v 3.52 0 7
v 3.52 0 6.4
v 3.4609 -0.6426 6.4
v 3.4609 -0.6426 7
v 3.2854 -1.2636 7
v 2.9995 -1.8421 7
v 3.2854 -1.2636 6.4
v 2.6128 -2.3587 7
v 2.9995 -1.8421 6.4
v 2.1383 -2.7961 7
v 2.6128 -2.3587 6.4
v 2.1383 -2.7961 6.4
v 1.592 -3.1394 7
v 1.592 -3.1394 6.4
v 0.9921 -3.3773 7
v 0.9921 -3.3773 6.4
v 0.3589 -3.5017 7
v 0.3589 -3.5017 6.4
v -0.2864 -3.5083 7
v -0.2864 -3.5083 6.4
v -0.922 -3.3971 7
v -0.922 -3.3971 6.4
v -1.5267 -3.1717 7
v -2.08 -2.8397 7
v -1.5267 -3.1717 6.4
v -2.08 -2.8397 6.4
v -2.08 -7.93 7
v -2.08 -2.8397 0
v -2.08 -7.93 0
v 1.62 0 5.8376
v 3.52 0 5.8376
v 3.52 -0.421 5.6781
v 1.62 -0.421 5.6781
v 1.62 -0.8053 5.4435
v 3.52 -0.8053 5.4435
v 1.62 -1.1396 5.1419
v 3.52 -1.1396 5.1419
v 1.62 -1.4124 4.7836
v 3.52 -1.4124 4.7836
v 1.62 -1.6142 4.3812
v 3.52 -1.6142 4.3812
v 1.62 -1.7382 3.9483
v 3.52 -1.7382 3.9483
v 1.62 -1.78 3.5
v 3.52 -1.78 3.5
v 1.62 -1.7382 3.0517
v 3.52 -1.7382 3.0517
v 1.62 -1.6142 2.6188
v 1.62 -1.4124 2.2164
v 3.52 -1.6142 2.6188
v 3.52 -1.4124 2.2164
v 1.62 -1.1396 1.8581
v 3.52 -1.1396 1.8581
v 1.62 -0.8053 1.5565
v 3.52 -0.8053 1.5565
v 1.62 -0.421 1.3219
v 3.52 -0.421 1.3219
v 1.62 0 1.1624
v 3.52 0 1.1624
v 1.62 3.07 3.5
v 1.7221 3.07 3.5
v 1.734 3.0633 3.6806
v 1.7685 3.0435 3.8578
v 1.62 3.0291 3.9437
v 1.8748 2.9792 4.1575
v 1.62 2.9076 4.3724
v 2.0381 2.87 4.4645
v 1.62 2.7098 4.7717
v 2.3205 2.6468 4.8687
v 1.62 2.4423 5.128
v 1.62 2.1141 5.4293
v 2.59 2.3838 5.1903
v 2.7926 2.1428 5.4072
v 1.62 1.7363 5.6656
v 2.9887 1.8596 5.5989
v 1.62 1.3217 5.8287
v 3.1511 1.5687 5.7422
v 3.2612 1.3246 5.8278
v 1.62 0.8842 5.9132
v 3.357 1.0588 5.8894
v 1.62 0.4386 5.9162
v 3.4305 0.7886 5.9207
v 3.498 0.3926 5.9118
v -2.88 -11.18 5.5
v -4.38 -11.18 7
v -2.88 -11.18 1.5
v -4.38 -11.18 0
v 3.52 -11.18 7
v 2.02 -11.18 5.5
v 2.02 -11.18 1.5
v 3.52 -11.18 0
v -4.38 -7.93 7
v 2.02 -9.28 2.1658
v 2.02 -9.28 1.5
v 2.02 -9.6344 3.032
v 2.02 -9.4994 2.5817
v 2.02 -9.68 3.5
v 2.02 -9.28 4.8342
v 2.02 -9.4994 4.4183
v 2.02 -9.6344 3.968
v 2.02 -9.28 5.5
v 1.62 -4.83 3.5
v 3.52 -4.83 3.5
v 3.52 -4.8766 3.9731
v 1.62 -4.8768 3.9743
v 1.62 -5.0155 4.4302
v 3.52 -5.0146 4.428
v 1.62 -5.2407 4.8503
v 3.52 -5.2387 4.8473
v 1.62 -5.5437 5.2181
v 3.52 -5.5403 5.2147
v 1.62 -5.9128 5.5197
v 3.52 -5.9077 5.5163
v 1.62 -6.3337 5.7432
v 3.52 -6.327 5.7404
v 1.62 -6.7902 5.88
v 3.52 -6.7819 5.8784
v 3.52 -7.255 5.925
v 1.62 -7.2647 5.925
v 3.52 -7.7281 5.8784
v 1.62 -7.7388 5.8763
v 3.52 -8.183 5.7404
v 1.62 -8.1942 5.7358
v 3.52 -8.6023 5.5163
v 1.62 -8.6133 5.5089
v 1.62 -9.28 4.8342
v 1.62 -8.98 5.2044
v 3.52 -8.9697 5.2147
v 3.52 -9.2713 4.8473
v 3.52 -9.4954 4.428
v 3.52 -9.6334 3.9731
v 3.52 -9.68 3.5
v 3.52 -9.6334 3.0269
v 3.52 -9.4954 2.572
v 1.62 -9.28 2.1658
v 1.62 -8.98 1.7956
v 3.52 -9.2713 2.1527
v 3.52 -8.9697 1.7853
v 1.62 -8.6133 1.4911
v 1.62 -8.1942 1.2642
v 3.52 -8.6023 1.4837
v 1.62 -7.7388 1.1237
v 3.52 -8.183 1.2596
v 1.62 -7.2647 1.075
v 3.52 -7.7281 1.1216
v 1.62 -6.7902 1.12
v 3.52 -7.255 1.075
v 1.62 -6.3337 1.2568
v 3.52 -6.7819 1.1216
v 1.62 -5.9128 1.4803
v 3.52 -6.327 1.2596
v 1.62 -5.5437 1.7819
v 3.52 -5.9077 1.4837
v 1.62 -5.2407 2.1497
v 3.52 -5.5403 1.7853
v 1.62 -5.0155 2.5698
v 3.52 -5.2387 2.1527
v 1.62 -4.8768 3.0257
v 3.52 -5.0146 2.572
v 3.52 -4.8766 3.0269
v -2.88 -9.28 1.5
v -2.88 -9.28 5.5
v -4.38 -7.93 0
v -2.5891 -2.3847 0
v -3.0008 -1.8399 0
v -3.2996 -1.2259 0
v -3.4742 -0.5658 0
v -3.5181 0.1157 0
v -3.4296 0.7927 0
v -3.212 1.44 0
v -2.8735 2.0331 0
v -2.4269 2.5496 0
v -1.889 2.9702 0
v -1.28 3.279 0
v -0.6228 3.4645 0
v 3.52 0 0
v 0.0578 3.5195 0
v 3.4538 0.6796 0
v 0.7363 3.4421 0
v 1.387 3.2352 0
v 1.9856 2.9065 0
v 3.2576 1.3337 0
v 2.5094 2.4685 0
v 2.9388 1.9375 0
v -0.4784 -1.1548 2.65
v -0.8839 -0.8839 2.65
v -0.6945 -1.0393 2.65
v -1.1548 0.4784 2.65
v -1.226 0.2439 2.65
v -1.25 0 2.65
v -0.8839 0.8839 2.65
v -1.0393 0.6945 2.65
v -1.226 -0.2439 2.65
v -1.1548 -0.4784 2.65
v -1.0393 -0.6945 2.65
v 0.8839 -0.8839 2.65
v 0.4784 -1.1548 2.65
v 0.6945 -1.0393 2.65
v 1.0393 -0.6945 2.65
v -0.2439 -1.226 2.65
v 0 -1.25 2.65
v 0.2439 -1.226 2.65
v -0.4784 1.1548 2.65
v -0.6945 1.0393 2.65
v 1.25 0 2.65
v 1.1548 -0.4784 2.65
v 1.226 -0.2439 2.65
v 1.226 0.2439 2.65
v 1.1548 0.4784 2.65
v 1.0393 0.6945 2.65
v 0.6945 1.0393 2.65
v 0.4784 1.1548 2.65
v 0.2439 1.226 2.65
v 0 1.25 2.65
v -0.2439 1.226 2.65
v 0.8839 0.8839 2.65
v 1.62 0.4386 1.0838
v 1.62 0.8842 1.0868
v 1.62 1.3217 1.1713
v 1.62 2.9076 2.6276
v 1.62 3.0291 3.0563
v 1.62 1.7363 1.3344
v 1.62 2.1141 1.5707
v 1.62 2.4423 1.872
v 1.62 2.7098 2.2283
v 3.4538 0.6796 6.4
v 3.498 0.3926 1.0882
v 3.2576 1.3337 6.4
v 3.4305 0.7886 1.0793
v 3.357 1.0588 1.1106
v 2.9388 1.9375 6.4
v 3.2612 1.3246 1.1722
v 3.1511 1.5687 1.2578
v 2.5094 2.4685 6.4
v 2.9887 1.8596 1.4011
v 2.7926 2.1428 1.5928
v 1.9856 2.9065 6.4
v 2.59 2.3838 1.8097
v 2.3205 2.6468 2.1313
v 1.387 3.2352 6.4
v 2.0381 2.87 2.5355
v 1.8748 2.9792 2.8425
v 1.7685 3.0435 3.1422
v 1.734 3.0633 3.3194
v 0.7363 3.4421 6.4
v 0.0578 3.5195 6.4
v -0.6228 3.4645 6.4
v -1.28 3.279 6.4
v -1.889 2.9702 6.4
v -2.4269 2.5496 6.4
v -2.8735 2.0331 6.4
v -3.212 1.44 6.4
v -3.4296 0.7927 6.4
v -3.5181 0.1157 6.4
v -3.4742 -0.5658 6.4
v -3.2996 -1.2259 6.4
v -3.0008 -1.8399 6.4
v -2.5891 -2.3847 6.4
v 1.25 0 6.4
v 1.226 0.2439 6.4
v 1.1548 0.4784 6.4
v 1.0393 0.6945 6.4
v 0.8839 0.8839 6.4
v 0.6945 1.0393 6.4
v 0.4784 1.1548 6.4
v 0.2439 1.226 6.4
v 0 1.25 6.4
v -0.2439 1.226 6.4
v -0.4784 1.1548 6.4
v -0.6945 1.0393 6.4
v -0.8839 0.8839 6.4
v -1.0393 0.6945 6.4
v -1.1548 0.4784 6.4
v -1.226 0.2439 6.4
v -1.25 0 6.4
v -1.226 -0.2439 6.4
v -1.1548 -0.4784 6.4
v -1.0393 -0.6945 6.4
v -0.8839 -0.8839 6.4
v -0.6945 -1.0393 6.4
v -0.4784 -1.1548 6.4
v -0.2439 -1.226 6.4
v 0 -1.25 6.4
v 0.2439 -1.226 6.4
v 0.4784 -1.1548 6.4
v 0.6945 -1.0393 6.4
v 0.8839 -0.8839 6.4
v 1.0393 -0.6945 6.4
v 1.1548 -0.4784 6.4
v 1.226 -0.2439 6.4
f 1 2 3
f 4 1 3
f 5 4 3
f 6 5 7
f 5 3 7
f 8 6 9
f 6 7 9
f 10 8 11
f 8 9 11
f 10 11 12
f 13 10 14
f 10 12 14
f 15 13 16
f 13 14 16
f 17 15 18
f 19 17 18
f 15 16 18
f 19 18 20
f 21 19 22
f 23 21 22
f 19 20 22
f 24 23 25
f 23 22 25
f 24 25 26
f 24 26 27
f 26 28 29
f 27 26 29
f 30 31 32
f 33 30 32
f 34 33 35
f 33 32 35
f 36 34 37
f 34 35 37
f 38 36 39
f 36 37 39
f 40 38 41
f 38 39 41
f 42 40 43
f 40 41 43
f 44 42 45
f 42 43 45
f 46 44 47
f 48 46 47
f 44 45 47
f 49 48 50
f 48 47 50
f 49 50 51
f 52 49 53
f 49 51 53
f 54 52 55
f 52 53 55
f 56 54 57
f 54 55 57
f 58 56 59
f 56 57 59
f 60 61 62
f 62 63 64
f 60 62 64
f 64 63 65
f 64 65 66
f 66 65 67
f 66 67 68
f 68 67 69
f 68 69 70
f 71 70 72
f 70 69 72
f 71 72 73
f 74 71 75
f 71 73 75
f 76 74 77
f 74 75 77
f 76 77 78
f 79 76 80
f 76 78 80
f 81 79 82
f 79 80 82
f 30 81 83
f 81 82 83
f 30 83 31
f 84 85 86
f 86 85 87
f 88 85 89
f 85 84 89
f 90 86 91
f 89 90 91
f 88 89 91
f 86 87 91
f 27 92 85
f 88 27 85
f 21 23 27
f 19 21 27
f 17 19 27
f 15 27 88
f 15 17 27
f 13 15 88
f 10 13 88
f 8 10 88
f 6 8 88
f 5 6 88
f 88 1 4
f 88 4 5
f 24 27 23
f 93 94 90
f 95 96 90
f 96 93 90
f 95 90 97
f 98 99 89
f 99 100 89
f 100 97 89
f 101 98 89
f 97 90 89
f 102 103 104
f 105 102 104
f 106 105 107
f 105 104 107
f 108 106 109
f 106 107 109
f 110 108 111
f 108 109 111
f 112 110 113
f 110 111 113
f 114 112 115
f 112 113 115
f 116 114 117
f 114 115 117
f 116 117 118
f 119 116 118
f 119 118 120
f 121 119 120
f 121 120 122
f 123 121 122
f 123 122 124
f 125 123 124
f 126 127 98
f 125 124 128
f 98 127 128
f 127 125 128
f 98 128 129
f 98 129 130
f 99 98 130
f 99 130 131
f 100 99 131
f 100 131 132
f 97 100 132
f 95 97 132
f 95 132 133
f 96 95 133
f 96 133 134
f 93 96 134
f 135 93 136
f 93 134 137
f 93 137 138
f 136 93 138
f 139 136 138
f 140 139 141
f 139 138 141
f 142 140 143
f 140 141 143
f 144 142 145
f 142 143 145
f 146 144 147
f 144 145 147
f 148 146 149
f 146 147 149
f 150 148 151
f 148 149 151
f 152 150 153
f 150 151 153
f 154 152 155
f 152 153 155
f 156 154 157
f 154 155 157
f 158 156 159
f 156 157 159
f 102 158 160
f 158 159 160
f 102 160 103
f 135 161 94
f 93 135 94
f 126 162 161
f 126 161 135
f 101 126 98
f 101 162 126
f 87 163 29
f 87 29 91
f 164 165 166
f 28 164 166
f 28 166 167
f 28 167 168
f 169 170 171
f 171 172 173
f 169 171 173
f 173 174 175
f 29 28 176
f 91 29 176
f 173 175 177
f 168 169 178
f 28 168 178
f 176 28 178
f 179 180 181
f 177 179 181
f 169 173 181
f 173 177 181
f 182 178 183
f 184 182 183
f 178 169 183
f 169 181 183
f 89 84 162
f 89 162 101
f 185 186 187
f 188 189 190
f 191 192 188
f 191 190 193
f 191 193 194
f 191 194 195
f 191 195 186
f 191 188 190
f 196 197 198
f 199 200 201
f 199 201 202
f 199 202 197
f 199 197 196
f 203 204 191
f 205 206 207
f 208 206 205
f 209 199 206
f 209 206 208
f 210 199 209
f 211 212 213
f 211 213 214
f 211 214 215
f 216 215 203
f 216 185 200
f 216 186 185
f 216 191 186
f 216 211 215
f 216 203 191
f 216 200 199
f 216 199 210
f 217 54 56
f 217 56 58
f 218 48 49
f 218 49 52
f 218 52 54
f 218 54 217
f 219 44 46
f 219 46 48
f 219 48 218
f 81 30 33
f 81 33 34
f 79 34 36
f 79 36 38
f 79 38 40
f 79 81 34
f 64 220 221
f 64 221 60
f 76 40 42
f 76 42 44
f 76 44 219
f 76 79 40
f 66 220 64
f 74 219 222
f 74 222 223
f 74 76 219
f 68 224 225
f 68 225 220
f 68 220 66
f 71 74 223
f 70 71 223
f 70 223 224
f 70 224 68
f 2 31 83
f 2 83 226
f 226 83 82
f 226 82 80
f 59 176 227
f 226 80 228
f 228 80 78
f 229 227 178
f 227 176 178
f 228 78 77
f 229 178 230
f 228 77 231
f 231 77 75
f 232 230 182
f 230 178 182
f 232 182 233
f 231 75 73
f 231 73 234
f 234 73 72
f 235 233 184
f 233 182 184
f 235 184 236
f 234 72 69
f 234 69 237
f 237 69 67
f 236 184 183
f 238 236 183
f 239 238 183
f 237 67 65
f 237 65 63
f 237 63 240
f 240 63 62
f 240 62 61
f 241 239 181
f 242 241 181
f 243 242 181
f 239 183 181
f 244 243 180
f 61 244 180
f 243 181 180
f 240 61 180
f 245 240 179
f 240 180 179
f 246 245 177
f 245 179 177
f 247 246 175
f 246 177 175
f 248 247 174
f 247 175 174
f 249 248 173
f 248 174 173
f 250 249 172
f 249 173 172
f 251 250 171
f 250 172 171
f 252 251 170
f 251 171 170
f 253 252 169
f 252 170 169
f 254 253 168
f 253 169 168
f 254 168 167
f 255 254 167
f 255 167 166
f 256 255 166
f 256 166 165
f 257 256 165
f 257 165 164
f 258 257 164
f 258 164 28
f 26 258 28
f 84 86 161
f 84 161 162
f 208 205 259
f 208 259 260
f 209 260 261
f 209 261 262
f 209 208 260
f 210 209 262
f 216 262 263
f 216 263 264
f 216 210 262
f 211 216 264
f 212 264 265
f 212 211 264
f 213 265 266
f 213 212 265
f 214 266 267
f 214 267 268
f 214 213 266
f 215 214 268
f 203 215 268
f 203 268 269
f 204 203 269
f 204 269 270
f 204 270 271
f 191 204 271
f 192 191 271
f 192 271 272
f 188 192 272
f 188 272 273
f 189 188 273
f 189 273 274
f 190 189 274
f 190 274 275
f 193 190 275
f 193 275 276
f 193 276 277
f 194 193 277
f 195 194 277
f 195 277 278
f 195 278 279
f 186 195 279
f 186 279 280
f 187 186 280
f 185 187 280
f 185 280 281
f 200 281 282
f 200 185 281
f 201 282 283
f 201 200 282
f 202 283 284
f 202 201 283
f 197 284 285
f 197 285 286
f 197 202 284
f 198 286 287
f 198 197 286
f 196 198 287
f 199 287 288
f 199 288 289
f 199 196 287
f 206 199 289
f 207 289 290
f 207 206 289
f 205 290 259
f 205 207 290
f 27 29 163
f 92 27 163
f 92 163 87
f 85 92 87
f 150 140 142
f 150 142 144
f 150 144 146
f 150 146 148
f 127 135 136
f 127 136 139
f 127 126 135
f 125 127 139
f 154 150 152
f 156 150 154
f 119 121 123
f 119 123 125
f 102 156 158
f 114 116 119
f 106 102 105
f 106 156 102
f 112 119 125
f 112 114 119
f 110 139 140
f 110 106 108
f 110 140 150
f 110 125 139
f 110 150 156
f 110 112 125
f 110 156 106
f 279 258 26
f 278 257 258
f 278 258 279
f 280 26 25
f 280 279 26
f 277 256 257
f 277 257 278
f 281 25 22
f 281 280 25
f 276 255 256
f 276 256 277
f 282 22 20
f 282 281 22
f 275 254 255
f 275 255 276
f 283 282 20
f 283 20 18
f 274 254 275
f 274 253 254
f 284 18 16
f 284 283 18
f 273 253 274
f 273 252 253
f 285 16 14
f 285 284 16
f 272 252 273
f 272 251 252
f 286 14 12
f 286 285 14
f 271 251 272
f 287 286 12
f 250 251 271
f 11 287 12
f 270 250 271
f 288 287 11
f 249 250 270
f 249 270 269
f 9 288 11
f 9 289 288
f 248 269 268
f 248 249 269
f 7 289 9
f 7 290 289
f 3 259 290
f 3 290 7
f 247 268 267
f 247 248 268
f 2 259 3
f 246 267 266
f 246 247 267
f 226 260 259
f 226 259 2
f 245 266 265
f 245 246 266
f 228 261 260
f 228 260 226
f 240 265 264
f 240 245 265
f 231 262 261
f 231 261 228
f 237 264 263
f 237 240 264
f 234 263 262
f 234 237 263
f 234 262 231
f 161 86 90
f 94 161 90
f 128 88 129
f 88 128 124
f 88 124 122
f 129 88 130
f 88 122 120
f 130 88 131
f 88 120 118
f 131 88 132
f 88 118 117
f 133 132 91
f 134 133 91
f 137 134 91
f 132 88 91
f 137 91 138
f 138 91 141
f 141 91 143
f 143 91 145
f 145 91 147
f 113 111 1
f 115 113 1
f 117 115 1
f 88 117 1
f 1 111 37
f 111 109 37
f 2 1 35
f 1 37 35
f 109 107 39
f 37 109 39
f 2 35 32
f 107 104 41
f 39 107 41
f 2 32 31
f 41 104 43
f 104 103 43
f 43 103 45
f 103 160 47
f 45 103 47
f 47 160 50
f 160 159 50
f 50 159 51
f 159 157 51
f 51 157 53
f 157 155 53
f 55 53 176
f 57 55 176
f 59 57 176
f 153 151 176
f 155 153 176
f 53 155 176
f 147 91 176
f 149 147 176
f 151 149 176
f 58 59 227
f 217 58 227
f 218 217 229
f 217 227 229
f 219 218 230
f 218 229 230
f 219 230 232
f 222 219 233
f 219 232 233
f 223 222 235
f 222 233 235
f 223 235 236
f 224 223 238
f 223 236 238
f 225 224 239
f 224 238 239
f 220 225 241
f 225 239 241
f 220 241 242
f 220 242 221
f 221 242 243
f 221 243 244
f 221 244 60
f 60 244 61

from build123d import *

# Parameters (mm, degrees)
F1_DEPTH = 7
F0_R     = 1.25
F2_DEPTH = 6.4
F3_DEPTH = 2.65
F4_W     = 4.9
F4_H     = 4
F5_DEPTH = 1.9
F6_R     = 2.425
F7_DEPTH = 1.9


with BuildPart() as f1:
    # F0 (on Top) → F1 (new body)
    with BuildSketch(Plane.XY):
        with BuildLine():
            Line((3.52, -11.18), (3.52, 0))
            ThreePointArc((3.52, 0), (1.5919798994, -3.1394266993), (-2.08, -2.8397182959))
            Line((-2.08, -2.8397182959), (-2.08, -7.93))
            Line((-2.08, -7.93), (-4.38, -7.93))
            Line((-4.38, -7.93), (-4.38, -11.18))
            Line((-4.38, -11.18), (0, -11.18))
            Line((0, -11.18), (3.52, -11.18))
        make_face()
    extrude(amount=F1_DEPTH)

    # F0 (on Top) → F2 (join)
    with BuildSketch(Plane.XY):
        with BuildLine():
            ThreePointArc((-2.08, -2.8397182959), (1.5919798994, -3.1394266993), (3.52, 0))
            ThreePointArc((3.52, 0), (-1.5919798994, 3.1394266993), (-2.08, -2.8397182959))
        make_face()
        Circle(F0_R, mode=Mode.SUBTRACT)
    extrude(amount=F2_DEPTH)

    # F0 (on Top) → F3 (join)
    with BuildSketch(Plane.XY):
        Circle(F0_R)
    extrude(amount=F3_DEPTH)

    # F4 (on face) → F5 (cut)
    with BuildSketch(Plane.XZ.offset(11.18)):
        with Locations((-0.43, 3.5)):
            Rectangle(F4_W, F4_H)
    extrude(amount=-F5_DEPTH, mode=Mode.SUBTRACT)

    # F6 (on face) → F7 (cut)
    with BuildSketch(Plane.YZ.offset(3.52)):
        with Locations((-7.255, 3.5)):
            Circle(F6_R)
        with BuildLine():
            ThreePointArc((0, 5.837648391), (-1.78, 3.5), (0, 1.162351609))
            Line((0, 1.162351609), (0, 5.837648391))
        make_face()
        with BuildLine():
            Line((0, 5.837648391), (0, 1.162351609))
            ThreePointArc((0, 1.162351609), (2.1140983629, 1.570654256), (3.07, 3.5))
            ThreePointArc((3.07, 3.5), (2.1140983629, 5.429345744), (0, 5.837648391))
        make_face()
    extrude(amount=-F7_DEPTH, mode=Mode.SUBTRACT)


solid = f1.part
